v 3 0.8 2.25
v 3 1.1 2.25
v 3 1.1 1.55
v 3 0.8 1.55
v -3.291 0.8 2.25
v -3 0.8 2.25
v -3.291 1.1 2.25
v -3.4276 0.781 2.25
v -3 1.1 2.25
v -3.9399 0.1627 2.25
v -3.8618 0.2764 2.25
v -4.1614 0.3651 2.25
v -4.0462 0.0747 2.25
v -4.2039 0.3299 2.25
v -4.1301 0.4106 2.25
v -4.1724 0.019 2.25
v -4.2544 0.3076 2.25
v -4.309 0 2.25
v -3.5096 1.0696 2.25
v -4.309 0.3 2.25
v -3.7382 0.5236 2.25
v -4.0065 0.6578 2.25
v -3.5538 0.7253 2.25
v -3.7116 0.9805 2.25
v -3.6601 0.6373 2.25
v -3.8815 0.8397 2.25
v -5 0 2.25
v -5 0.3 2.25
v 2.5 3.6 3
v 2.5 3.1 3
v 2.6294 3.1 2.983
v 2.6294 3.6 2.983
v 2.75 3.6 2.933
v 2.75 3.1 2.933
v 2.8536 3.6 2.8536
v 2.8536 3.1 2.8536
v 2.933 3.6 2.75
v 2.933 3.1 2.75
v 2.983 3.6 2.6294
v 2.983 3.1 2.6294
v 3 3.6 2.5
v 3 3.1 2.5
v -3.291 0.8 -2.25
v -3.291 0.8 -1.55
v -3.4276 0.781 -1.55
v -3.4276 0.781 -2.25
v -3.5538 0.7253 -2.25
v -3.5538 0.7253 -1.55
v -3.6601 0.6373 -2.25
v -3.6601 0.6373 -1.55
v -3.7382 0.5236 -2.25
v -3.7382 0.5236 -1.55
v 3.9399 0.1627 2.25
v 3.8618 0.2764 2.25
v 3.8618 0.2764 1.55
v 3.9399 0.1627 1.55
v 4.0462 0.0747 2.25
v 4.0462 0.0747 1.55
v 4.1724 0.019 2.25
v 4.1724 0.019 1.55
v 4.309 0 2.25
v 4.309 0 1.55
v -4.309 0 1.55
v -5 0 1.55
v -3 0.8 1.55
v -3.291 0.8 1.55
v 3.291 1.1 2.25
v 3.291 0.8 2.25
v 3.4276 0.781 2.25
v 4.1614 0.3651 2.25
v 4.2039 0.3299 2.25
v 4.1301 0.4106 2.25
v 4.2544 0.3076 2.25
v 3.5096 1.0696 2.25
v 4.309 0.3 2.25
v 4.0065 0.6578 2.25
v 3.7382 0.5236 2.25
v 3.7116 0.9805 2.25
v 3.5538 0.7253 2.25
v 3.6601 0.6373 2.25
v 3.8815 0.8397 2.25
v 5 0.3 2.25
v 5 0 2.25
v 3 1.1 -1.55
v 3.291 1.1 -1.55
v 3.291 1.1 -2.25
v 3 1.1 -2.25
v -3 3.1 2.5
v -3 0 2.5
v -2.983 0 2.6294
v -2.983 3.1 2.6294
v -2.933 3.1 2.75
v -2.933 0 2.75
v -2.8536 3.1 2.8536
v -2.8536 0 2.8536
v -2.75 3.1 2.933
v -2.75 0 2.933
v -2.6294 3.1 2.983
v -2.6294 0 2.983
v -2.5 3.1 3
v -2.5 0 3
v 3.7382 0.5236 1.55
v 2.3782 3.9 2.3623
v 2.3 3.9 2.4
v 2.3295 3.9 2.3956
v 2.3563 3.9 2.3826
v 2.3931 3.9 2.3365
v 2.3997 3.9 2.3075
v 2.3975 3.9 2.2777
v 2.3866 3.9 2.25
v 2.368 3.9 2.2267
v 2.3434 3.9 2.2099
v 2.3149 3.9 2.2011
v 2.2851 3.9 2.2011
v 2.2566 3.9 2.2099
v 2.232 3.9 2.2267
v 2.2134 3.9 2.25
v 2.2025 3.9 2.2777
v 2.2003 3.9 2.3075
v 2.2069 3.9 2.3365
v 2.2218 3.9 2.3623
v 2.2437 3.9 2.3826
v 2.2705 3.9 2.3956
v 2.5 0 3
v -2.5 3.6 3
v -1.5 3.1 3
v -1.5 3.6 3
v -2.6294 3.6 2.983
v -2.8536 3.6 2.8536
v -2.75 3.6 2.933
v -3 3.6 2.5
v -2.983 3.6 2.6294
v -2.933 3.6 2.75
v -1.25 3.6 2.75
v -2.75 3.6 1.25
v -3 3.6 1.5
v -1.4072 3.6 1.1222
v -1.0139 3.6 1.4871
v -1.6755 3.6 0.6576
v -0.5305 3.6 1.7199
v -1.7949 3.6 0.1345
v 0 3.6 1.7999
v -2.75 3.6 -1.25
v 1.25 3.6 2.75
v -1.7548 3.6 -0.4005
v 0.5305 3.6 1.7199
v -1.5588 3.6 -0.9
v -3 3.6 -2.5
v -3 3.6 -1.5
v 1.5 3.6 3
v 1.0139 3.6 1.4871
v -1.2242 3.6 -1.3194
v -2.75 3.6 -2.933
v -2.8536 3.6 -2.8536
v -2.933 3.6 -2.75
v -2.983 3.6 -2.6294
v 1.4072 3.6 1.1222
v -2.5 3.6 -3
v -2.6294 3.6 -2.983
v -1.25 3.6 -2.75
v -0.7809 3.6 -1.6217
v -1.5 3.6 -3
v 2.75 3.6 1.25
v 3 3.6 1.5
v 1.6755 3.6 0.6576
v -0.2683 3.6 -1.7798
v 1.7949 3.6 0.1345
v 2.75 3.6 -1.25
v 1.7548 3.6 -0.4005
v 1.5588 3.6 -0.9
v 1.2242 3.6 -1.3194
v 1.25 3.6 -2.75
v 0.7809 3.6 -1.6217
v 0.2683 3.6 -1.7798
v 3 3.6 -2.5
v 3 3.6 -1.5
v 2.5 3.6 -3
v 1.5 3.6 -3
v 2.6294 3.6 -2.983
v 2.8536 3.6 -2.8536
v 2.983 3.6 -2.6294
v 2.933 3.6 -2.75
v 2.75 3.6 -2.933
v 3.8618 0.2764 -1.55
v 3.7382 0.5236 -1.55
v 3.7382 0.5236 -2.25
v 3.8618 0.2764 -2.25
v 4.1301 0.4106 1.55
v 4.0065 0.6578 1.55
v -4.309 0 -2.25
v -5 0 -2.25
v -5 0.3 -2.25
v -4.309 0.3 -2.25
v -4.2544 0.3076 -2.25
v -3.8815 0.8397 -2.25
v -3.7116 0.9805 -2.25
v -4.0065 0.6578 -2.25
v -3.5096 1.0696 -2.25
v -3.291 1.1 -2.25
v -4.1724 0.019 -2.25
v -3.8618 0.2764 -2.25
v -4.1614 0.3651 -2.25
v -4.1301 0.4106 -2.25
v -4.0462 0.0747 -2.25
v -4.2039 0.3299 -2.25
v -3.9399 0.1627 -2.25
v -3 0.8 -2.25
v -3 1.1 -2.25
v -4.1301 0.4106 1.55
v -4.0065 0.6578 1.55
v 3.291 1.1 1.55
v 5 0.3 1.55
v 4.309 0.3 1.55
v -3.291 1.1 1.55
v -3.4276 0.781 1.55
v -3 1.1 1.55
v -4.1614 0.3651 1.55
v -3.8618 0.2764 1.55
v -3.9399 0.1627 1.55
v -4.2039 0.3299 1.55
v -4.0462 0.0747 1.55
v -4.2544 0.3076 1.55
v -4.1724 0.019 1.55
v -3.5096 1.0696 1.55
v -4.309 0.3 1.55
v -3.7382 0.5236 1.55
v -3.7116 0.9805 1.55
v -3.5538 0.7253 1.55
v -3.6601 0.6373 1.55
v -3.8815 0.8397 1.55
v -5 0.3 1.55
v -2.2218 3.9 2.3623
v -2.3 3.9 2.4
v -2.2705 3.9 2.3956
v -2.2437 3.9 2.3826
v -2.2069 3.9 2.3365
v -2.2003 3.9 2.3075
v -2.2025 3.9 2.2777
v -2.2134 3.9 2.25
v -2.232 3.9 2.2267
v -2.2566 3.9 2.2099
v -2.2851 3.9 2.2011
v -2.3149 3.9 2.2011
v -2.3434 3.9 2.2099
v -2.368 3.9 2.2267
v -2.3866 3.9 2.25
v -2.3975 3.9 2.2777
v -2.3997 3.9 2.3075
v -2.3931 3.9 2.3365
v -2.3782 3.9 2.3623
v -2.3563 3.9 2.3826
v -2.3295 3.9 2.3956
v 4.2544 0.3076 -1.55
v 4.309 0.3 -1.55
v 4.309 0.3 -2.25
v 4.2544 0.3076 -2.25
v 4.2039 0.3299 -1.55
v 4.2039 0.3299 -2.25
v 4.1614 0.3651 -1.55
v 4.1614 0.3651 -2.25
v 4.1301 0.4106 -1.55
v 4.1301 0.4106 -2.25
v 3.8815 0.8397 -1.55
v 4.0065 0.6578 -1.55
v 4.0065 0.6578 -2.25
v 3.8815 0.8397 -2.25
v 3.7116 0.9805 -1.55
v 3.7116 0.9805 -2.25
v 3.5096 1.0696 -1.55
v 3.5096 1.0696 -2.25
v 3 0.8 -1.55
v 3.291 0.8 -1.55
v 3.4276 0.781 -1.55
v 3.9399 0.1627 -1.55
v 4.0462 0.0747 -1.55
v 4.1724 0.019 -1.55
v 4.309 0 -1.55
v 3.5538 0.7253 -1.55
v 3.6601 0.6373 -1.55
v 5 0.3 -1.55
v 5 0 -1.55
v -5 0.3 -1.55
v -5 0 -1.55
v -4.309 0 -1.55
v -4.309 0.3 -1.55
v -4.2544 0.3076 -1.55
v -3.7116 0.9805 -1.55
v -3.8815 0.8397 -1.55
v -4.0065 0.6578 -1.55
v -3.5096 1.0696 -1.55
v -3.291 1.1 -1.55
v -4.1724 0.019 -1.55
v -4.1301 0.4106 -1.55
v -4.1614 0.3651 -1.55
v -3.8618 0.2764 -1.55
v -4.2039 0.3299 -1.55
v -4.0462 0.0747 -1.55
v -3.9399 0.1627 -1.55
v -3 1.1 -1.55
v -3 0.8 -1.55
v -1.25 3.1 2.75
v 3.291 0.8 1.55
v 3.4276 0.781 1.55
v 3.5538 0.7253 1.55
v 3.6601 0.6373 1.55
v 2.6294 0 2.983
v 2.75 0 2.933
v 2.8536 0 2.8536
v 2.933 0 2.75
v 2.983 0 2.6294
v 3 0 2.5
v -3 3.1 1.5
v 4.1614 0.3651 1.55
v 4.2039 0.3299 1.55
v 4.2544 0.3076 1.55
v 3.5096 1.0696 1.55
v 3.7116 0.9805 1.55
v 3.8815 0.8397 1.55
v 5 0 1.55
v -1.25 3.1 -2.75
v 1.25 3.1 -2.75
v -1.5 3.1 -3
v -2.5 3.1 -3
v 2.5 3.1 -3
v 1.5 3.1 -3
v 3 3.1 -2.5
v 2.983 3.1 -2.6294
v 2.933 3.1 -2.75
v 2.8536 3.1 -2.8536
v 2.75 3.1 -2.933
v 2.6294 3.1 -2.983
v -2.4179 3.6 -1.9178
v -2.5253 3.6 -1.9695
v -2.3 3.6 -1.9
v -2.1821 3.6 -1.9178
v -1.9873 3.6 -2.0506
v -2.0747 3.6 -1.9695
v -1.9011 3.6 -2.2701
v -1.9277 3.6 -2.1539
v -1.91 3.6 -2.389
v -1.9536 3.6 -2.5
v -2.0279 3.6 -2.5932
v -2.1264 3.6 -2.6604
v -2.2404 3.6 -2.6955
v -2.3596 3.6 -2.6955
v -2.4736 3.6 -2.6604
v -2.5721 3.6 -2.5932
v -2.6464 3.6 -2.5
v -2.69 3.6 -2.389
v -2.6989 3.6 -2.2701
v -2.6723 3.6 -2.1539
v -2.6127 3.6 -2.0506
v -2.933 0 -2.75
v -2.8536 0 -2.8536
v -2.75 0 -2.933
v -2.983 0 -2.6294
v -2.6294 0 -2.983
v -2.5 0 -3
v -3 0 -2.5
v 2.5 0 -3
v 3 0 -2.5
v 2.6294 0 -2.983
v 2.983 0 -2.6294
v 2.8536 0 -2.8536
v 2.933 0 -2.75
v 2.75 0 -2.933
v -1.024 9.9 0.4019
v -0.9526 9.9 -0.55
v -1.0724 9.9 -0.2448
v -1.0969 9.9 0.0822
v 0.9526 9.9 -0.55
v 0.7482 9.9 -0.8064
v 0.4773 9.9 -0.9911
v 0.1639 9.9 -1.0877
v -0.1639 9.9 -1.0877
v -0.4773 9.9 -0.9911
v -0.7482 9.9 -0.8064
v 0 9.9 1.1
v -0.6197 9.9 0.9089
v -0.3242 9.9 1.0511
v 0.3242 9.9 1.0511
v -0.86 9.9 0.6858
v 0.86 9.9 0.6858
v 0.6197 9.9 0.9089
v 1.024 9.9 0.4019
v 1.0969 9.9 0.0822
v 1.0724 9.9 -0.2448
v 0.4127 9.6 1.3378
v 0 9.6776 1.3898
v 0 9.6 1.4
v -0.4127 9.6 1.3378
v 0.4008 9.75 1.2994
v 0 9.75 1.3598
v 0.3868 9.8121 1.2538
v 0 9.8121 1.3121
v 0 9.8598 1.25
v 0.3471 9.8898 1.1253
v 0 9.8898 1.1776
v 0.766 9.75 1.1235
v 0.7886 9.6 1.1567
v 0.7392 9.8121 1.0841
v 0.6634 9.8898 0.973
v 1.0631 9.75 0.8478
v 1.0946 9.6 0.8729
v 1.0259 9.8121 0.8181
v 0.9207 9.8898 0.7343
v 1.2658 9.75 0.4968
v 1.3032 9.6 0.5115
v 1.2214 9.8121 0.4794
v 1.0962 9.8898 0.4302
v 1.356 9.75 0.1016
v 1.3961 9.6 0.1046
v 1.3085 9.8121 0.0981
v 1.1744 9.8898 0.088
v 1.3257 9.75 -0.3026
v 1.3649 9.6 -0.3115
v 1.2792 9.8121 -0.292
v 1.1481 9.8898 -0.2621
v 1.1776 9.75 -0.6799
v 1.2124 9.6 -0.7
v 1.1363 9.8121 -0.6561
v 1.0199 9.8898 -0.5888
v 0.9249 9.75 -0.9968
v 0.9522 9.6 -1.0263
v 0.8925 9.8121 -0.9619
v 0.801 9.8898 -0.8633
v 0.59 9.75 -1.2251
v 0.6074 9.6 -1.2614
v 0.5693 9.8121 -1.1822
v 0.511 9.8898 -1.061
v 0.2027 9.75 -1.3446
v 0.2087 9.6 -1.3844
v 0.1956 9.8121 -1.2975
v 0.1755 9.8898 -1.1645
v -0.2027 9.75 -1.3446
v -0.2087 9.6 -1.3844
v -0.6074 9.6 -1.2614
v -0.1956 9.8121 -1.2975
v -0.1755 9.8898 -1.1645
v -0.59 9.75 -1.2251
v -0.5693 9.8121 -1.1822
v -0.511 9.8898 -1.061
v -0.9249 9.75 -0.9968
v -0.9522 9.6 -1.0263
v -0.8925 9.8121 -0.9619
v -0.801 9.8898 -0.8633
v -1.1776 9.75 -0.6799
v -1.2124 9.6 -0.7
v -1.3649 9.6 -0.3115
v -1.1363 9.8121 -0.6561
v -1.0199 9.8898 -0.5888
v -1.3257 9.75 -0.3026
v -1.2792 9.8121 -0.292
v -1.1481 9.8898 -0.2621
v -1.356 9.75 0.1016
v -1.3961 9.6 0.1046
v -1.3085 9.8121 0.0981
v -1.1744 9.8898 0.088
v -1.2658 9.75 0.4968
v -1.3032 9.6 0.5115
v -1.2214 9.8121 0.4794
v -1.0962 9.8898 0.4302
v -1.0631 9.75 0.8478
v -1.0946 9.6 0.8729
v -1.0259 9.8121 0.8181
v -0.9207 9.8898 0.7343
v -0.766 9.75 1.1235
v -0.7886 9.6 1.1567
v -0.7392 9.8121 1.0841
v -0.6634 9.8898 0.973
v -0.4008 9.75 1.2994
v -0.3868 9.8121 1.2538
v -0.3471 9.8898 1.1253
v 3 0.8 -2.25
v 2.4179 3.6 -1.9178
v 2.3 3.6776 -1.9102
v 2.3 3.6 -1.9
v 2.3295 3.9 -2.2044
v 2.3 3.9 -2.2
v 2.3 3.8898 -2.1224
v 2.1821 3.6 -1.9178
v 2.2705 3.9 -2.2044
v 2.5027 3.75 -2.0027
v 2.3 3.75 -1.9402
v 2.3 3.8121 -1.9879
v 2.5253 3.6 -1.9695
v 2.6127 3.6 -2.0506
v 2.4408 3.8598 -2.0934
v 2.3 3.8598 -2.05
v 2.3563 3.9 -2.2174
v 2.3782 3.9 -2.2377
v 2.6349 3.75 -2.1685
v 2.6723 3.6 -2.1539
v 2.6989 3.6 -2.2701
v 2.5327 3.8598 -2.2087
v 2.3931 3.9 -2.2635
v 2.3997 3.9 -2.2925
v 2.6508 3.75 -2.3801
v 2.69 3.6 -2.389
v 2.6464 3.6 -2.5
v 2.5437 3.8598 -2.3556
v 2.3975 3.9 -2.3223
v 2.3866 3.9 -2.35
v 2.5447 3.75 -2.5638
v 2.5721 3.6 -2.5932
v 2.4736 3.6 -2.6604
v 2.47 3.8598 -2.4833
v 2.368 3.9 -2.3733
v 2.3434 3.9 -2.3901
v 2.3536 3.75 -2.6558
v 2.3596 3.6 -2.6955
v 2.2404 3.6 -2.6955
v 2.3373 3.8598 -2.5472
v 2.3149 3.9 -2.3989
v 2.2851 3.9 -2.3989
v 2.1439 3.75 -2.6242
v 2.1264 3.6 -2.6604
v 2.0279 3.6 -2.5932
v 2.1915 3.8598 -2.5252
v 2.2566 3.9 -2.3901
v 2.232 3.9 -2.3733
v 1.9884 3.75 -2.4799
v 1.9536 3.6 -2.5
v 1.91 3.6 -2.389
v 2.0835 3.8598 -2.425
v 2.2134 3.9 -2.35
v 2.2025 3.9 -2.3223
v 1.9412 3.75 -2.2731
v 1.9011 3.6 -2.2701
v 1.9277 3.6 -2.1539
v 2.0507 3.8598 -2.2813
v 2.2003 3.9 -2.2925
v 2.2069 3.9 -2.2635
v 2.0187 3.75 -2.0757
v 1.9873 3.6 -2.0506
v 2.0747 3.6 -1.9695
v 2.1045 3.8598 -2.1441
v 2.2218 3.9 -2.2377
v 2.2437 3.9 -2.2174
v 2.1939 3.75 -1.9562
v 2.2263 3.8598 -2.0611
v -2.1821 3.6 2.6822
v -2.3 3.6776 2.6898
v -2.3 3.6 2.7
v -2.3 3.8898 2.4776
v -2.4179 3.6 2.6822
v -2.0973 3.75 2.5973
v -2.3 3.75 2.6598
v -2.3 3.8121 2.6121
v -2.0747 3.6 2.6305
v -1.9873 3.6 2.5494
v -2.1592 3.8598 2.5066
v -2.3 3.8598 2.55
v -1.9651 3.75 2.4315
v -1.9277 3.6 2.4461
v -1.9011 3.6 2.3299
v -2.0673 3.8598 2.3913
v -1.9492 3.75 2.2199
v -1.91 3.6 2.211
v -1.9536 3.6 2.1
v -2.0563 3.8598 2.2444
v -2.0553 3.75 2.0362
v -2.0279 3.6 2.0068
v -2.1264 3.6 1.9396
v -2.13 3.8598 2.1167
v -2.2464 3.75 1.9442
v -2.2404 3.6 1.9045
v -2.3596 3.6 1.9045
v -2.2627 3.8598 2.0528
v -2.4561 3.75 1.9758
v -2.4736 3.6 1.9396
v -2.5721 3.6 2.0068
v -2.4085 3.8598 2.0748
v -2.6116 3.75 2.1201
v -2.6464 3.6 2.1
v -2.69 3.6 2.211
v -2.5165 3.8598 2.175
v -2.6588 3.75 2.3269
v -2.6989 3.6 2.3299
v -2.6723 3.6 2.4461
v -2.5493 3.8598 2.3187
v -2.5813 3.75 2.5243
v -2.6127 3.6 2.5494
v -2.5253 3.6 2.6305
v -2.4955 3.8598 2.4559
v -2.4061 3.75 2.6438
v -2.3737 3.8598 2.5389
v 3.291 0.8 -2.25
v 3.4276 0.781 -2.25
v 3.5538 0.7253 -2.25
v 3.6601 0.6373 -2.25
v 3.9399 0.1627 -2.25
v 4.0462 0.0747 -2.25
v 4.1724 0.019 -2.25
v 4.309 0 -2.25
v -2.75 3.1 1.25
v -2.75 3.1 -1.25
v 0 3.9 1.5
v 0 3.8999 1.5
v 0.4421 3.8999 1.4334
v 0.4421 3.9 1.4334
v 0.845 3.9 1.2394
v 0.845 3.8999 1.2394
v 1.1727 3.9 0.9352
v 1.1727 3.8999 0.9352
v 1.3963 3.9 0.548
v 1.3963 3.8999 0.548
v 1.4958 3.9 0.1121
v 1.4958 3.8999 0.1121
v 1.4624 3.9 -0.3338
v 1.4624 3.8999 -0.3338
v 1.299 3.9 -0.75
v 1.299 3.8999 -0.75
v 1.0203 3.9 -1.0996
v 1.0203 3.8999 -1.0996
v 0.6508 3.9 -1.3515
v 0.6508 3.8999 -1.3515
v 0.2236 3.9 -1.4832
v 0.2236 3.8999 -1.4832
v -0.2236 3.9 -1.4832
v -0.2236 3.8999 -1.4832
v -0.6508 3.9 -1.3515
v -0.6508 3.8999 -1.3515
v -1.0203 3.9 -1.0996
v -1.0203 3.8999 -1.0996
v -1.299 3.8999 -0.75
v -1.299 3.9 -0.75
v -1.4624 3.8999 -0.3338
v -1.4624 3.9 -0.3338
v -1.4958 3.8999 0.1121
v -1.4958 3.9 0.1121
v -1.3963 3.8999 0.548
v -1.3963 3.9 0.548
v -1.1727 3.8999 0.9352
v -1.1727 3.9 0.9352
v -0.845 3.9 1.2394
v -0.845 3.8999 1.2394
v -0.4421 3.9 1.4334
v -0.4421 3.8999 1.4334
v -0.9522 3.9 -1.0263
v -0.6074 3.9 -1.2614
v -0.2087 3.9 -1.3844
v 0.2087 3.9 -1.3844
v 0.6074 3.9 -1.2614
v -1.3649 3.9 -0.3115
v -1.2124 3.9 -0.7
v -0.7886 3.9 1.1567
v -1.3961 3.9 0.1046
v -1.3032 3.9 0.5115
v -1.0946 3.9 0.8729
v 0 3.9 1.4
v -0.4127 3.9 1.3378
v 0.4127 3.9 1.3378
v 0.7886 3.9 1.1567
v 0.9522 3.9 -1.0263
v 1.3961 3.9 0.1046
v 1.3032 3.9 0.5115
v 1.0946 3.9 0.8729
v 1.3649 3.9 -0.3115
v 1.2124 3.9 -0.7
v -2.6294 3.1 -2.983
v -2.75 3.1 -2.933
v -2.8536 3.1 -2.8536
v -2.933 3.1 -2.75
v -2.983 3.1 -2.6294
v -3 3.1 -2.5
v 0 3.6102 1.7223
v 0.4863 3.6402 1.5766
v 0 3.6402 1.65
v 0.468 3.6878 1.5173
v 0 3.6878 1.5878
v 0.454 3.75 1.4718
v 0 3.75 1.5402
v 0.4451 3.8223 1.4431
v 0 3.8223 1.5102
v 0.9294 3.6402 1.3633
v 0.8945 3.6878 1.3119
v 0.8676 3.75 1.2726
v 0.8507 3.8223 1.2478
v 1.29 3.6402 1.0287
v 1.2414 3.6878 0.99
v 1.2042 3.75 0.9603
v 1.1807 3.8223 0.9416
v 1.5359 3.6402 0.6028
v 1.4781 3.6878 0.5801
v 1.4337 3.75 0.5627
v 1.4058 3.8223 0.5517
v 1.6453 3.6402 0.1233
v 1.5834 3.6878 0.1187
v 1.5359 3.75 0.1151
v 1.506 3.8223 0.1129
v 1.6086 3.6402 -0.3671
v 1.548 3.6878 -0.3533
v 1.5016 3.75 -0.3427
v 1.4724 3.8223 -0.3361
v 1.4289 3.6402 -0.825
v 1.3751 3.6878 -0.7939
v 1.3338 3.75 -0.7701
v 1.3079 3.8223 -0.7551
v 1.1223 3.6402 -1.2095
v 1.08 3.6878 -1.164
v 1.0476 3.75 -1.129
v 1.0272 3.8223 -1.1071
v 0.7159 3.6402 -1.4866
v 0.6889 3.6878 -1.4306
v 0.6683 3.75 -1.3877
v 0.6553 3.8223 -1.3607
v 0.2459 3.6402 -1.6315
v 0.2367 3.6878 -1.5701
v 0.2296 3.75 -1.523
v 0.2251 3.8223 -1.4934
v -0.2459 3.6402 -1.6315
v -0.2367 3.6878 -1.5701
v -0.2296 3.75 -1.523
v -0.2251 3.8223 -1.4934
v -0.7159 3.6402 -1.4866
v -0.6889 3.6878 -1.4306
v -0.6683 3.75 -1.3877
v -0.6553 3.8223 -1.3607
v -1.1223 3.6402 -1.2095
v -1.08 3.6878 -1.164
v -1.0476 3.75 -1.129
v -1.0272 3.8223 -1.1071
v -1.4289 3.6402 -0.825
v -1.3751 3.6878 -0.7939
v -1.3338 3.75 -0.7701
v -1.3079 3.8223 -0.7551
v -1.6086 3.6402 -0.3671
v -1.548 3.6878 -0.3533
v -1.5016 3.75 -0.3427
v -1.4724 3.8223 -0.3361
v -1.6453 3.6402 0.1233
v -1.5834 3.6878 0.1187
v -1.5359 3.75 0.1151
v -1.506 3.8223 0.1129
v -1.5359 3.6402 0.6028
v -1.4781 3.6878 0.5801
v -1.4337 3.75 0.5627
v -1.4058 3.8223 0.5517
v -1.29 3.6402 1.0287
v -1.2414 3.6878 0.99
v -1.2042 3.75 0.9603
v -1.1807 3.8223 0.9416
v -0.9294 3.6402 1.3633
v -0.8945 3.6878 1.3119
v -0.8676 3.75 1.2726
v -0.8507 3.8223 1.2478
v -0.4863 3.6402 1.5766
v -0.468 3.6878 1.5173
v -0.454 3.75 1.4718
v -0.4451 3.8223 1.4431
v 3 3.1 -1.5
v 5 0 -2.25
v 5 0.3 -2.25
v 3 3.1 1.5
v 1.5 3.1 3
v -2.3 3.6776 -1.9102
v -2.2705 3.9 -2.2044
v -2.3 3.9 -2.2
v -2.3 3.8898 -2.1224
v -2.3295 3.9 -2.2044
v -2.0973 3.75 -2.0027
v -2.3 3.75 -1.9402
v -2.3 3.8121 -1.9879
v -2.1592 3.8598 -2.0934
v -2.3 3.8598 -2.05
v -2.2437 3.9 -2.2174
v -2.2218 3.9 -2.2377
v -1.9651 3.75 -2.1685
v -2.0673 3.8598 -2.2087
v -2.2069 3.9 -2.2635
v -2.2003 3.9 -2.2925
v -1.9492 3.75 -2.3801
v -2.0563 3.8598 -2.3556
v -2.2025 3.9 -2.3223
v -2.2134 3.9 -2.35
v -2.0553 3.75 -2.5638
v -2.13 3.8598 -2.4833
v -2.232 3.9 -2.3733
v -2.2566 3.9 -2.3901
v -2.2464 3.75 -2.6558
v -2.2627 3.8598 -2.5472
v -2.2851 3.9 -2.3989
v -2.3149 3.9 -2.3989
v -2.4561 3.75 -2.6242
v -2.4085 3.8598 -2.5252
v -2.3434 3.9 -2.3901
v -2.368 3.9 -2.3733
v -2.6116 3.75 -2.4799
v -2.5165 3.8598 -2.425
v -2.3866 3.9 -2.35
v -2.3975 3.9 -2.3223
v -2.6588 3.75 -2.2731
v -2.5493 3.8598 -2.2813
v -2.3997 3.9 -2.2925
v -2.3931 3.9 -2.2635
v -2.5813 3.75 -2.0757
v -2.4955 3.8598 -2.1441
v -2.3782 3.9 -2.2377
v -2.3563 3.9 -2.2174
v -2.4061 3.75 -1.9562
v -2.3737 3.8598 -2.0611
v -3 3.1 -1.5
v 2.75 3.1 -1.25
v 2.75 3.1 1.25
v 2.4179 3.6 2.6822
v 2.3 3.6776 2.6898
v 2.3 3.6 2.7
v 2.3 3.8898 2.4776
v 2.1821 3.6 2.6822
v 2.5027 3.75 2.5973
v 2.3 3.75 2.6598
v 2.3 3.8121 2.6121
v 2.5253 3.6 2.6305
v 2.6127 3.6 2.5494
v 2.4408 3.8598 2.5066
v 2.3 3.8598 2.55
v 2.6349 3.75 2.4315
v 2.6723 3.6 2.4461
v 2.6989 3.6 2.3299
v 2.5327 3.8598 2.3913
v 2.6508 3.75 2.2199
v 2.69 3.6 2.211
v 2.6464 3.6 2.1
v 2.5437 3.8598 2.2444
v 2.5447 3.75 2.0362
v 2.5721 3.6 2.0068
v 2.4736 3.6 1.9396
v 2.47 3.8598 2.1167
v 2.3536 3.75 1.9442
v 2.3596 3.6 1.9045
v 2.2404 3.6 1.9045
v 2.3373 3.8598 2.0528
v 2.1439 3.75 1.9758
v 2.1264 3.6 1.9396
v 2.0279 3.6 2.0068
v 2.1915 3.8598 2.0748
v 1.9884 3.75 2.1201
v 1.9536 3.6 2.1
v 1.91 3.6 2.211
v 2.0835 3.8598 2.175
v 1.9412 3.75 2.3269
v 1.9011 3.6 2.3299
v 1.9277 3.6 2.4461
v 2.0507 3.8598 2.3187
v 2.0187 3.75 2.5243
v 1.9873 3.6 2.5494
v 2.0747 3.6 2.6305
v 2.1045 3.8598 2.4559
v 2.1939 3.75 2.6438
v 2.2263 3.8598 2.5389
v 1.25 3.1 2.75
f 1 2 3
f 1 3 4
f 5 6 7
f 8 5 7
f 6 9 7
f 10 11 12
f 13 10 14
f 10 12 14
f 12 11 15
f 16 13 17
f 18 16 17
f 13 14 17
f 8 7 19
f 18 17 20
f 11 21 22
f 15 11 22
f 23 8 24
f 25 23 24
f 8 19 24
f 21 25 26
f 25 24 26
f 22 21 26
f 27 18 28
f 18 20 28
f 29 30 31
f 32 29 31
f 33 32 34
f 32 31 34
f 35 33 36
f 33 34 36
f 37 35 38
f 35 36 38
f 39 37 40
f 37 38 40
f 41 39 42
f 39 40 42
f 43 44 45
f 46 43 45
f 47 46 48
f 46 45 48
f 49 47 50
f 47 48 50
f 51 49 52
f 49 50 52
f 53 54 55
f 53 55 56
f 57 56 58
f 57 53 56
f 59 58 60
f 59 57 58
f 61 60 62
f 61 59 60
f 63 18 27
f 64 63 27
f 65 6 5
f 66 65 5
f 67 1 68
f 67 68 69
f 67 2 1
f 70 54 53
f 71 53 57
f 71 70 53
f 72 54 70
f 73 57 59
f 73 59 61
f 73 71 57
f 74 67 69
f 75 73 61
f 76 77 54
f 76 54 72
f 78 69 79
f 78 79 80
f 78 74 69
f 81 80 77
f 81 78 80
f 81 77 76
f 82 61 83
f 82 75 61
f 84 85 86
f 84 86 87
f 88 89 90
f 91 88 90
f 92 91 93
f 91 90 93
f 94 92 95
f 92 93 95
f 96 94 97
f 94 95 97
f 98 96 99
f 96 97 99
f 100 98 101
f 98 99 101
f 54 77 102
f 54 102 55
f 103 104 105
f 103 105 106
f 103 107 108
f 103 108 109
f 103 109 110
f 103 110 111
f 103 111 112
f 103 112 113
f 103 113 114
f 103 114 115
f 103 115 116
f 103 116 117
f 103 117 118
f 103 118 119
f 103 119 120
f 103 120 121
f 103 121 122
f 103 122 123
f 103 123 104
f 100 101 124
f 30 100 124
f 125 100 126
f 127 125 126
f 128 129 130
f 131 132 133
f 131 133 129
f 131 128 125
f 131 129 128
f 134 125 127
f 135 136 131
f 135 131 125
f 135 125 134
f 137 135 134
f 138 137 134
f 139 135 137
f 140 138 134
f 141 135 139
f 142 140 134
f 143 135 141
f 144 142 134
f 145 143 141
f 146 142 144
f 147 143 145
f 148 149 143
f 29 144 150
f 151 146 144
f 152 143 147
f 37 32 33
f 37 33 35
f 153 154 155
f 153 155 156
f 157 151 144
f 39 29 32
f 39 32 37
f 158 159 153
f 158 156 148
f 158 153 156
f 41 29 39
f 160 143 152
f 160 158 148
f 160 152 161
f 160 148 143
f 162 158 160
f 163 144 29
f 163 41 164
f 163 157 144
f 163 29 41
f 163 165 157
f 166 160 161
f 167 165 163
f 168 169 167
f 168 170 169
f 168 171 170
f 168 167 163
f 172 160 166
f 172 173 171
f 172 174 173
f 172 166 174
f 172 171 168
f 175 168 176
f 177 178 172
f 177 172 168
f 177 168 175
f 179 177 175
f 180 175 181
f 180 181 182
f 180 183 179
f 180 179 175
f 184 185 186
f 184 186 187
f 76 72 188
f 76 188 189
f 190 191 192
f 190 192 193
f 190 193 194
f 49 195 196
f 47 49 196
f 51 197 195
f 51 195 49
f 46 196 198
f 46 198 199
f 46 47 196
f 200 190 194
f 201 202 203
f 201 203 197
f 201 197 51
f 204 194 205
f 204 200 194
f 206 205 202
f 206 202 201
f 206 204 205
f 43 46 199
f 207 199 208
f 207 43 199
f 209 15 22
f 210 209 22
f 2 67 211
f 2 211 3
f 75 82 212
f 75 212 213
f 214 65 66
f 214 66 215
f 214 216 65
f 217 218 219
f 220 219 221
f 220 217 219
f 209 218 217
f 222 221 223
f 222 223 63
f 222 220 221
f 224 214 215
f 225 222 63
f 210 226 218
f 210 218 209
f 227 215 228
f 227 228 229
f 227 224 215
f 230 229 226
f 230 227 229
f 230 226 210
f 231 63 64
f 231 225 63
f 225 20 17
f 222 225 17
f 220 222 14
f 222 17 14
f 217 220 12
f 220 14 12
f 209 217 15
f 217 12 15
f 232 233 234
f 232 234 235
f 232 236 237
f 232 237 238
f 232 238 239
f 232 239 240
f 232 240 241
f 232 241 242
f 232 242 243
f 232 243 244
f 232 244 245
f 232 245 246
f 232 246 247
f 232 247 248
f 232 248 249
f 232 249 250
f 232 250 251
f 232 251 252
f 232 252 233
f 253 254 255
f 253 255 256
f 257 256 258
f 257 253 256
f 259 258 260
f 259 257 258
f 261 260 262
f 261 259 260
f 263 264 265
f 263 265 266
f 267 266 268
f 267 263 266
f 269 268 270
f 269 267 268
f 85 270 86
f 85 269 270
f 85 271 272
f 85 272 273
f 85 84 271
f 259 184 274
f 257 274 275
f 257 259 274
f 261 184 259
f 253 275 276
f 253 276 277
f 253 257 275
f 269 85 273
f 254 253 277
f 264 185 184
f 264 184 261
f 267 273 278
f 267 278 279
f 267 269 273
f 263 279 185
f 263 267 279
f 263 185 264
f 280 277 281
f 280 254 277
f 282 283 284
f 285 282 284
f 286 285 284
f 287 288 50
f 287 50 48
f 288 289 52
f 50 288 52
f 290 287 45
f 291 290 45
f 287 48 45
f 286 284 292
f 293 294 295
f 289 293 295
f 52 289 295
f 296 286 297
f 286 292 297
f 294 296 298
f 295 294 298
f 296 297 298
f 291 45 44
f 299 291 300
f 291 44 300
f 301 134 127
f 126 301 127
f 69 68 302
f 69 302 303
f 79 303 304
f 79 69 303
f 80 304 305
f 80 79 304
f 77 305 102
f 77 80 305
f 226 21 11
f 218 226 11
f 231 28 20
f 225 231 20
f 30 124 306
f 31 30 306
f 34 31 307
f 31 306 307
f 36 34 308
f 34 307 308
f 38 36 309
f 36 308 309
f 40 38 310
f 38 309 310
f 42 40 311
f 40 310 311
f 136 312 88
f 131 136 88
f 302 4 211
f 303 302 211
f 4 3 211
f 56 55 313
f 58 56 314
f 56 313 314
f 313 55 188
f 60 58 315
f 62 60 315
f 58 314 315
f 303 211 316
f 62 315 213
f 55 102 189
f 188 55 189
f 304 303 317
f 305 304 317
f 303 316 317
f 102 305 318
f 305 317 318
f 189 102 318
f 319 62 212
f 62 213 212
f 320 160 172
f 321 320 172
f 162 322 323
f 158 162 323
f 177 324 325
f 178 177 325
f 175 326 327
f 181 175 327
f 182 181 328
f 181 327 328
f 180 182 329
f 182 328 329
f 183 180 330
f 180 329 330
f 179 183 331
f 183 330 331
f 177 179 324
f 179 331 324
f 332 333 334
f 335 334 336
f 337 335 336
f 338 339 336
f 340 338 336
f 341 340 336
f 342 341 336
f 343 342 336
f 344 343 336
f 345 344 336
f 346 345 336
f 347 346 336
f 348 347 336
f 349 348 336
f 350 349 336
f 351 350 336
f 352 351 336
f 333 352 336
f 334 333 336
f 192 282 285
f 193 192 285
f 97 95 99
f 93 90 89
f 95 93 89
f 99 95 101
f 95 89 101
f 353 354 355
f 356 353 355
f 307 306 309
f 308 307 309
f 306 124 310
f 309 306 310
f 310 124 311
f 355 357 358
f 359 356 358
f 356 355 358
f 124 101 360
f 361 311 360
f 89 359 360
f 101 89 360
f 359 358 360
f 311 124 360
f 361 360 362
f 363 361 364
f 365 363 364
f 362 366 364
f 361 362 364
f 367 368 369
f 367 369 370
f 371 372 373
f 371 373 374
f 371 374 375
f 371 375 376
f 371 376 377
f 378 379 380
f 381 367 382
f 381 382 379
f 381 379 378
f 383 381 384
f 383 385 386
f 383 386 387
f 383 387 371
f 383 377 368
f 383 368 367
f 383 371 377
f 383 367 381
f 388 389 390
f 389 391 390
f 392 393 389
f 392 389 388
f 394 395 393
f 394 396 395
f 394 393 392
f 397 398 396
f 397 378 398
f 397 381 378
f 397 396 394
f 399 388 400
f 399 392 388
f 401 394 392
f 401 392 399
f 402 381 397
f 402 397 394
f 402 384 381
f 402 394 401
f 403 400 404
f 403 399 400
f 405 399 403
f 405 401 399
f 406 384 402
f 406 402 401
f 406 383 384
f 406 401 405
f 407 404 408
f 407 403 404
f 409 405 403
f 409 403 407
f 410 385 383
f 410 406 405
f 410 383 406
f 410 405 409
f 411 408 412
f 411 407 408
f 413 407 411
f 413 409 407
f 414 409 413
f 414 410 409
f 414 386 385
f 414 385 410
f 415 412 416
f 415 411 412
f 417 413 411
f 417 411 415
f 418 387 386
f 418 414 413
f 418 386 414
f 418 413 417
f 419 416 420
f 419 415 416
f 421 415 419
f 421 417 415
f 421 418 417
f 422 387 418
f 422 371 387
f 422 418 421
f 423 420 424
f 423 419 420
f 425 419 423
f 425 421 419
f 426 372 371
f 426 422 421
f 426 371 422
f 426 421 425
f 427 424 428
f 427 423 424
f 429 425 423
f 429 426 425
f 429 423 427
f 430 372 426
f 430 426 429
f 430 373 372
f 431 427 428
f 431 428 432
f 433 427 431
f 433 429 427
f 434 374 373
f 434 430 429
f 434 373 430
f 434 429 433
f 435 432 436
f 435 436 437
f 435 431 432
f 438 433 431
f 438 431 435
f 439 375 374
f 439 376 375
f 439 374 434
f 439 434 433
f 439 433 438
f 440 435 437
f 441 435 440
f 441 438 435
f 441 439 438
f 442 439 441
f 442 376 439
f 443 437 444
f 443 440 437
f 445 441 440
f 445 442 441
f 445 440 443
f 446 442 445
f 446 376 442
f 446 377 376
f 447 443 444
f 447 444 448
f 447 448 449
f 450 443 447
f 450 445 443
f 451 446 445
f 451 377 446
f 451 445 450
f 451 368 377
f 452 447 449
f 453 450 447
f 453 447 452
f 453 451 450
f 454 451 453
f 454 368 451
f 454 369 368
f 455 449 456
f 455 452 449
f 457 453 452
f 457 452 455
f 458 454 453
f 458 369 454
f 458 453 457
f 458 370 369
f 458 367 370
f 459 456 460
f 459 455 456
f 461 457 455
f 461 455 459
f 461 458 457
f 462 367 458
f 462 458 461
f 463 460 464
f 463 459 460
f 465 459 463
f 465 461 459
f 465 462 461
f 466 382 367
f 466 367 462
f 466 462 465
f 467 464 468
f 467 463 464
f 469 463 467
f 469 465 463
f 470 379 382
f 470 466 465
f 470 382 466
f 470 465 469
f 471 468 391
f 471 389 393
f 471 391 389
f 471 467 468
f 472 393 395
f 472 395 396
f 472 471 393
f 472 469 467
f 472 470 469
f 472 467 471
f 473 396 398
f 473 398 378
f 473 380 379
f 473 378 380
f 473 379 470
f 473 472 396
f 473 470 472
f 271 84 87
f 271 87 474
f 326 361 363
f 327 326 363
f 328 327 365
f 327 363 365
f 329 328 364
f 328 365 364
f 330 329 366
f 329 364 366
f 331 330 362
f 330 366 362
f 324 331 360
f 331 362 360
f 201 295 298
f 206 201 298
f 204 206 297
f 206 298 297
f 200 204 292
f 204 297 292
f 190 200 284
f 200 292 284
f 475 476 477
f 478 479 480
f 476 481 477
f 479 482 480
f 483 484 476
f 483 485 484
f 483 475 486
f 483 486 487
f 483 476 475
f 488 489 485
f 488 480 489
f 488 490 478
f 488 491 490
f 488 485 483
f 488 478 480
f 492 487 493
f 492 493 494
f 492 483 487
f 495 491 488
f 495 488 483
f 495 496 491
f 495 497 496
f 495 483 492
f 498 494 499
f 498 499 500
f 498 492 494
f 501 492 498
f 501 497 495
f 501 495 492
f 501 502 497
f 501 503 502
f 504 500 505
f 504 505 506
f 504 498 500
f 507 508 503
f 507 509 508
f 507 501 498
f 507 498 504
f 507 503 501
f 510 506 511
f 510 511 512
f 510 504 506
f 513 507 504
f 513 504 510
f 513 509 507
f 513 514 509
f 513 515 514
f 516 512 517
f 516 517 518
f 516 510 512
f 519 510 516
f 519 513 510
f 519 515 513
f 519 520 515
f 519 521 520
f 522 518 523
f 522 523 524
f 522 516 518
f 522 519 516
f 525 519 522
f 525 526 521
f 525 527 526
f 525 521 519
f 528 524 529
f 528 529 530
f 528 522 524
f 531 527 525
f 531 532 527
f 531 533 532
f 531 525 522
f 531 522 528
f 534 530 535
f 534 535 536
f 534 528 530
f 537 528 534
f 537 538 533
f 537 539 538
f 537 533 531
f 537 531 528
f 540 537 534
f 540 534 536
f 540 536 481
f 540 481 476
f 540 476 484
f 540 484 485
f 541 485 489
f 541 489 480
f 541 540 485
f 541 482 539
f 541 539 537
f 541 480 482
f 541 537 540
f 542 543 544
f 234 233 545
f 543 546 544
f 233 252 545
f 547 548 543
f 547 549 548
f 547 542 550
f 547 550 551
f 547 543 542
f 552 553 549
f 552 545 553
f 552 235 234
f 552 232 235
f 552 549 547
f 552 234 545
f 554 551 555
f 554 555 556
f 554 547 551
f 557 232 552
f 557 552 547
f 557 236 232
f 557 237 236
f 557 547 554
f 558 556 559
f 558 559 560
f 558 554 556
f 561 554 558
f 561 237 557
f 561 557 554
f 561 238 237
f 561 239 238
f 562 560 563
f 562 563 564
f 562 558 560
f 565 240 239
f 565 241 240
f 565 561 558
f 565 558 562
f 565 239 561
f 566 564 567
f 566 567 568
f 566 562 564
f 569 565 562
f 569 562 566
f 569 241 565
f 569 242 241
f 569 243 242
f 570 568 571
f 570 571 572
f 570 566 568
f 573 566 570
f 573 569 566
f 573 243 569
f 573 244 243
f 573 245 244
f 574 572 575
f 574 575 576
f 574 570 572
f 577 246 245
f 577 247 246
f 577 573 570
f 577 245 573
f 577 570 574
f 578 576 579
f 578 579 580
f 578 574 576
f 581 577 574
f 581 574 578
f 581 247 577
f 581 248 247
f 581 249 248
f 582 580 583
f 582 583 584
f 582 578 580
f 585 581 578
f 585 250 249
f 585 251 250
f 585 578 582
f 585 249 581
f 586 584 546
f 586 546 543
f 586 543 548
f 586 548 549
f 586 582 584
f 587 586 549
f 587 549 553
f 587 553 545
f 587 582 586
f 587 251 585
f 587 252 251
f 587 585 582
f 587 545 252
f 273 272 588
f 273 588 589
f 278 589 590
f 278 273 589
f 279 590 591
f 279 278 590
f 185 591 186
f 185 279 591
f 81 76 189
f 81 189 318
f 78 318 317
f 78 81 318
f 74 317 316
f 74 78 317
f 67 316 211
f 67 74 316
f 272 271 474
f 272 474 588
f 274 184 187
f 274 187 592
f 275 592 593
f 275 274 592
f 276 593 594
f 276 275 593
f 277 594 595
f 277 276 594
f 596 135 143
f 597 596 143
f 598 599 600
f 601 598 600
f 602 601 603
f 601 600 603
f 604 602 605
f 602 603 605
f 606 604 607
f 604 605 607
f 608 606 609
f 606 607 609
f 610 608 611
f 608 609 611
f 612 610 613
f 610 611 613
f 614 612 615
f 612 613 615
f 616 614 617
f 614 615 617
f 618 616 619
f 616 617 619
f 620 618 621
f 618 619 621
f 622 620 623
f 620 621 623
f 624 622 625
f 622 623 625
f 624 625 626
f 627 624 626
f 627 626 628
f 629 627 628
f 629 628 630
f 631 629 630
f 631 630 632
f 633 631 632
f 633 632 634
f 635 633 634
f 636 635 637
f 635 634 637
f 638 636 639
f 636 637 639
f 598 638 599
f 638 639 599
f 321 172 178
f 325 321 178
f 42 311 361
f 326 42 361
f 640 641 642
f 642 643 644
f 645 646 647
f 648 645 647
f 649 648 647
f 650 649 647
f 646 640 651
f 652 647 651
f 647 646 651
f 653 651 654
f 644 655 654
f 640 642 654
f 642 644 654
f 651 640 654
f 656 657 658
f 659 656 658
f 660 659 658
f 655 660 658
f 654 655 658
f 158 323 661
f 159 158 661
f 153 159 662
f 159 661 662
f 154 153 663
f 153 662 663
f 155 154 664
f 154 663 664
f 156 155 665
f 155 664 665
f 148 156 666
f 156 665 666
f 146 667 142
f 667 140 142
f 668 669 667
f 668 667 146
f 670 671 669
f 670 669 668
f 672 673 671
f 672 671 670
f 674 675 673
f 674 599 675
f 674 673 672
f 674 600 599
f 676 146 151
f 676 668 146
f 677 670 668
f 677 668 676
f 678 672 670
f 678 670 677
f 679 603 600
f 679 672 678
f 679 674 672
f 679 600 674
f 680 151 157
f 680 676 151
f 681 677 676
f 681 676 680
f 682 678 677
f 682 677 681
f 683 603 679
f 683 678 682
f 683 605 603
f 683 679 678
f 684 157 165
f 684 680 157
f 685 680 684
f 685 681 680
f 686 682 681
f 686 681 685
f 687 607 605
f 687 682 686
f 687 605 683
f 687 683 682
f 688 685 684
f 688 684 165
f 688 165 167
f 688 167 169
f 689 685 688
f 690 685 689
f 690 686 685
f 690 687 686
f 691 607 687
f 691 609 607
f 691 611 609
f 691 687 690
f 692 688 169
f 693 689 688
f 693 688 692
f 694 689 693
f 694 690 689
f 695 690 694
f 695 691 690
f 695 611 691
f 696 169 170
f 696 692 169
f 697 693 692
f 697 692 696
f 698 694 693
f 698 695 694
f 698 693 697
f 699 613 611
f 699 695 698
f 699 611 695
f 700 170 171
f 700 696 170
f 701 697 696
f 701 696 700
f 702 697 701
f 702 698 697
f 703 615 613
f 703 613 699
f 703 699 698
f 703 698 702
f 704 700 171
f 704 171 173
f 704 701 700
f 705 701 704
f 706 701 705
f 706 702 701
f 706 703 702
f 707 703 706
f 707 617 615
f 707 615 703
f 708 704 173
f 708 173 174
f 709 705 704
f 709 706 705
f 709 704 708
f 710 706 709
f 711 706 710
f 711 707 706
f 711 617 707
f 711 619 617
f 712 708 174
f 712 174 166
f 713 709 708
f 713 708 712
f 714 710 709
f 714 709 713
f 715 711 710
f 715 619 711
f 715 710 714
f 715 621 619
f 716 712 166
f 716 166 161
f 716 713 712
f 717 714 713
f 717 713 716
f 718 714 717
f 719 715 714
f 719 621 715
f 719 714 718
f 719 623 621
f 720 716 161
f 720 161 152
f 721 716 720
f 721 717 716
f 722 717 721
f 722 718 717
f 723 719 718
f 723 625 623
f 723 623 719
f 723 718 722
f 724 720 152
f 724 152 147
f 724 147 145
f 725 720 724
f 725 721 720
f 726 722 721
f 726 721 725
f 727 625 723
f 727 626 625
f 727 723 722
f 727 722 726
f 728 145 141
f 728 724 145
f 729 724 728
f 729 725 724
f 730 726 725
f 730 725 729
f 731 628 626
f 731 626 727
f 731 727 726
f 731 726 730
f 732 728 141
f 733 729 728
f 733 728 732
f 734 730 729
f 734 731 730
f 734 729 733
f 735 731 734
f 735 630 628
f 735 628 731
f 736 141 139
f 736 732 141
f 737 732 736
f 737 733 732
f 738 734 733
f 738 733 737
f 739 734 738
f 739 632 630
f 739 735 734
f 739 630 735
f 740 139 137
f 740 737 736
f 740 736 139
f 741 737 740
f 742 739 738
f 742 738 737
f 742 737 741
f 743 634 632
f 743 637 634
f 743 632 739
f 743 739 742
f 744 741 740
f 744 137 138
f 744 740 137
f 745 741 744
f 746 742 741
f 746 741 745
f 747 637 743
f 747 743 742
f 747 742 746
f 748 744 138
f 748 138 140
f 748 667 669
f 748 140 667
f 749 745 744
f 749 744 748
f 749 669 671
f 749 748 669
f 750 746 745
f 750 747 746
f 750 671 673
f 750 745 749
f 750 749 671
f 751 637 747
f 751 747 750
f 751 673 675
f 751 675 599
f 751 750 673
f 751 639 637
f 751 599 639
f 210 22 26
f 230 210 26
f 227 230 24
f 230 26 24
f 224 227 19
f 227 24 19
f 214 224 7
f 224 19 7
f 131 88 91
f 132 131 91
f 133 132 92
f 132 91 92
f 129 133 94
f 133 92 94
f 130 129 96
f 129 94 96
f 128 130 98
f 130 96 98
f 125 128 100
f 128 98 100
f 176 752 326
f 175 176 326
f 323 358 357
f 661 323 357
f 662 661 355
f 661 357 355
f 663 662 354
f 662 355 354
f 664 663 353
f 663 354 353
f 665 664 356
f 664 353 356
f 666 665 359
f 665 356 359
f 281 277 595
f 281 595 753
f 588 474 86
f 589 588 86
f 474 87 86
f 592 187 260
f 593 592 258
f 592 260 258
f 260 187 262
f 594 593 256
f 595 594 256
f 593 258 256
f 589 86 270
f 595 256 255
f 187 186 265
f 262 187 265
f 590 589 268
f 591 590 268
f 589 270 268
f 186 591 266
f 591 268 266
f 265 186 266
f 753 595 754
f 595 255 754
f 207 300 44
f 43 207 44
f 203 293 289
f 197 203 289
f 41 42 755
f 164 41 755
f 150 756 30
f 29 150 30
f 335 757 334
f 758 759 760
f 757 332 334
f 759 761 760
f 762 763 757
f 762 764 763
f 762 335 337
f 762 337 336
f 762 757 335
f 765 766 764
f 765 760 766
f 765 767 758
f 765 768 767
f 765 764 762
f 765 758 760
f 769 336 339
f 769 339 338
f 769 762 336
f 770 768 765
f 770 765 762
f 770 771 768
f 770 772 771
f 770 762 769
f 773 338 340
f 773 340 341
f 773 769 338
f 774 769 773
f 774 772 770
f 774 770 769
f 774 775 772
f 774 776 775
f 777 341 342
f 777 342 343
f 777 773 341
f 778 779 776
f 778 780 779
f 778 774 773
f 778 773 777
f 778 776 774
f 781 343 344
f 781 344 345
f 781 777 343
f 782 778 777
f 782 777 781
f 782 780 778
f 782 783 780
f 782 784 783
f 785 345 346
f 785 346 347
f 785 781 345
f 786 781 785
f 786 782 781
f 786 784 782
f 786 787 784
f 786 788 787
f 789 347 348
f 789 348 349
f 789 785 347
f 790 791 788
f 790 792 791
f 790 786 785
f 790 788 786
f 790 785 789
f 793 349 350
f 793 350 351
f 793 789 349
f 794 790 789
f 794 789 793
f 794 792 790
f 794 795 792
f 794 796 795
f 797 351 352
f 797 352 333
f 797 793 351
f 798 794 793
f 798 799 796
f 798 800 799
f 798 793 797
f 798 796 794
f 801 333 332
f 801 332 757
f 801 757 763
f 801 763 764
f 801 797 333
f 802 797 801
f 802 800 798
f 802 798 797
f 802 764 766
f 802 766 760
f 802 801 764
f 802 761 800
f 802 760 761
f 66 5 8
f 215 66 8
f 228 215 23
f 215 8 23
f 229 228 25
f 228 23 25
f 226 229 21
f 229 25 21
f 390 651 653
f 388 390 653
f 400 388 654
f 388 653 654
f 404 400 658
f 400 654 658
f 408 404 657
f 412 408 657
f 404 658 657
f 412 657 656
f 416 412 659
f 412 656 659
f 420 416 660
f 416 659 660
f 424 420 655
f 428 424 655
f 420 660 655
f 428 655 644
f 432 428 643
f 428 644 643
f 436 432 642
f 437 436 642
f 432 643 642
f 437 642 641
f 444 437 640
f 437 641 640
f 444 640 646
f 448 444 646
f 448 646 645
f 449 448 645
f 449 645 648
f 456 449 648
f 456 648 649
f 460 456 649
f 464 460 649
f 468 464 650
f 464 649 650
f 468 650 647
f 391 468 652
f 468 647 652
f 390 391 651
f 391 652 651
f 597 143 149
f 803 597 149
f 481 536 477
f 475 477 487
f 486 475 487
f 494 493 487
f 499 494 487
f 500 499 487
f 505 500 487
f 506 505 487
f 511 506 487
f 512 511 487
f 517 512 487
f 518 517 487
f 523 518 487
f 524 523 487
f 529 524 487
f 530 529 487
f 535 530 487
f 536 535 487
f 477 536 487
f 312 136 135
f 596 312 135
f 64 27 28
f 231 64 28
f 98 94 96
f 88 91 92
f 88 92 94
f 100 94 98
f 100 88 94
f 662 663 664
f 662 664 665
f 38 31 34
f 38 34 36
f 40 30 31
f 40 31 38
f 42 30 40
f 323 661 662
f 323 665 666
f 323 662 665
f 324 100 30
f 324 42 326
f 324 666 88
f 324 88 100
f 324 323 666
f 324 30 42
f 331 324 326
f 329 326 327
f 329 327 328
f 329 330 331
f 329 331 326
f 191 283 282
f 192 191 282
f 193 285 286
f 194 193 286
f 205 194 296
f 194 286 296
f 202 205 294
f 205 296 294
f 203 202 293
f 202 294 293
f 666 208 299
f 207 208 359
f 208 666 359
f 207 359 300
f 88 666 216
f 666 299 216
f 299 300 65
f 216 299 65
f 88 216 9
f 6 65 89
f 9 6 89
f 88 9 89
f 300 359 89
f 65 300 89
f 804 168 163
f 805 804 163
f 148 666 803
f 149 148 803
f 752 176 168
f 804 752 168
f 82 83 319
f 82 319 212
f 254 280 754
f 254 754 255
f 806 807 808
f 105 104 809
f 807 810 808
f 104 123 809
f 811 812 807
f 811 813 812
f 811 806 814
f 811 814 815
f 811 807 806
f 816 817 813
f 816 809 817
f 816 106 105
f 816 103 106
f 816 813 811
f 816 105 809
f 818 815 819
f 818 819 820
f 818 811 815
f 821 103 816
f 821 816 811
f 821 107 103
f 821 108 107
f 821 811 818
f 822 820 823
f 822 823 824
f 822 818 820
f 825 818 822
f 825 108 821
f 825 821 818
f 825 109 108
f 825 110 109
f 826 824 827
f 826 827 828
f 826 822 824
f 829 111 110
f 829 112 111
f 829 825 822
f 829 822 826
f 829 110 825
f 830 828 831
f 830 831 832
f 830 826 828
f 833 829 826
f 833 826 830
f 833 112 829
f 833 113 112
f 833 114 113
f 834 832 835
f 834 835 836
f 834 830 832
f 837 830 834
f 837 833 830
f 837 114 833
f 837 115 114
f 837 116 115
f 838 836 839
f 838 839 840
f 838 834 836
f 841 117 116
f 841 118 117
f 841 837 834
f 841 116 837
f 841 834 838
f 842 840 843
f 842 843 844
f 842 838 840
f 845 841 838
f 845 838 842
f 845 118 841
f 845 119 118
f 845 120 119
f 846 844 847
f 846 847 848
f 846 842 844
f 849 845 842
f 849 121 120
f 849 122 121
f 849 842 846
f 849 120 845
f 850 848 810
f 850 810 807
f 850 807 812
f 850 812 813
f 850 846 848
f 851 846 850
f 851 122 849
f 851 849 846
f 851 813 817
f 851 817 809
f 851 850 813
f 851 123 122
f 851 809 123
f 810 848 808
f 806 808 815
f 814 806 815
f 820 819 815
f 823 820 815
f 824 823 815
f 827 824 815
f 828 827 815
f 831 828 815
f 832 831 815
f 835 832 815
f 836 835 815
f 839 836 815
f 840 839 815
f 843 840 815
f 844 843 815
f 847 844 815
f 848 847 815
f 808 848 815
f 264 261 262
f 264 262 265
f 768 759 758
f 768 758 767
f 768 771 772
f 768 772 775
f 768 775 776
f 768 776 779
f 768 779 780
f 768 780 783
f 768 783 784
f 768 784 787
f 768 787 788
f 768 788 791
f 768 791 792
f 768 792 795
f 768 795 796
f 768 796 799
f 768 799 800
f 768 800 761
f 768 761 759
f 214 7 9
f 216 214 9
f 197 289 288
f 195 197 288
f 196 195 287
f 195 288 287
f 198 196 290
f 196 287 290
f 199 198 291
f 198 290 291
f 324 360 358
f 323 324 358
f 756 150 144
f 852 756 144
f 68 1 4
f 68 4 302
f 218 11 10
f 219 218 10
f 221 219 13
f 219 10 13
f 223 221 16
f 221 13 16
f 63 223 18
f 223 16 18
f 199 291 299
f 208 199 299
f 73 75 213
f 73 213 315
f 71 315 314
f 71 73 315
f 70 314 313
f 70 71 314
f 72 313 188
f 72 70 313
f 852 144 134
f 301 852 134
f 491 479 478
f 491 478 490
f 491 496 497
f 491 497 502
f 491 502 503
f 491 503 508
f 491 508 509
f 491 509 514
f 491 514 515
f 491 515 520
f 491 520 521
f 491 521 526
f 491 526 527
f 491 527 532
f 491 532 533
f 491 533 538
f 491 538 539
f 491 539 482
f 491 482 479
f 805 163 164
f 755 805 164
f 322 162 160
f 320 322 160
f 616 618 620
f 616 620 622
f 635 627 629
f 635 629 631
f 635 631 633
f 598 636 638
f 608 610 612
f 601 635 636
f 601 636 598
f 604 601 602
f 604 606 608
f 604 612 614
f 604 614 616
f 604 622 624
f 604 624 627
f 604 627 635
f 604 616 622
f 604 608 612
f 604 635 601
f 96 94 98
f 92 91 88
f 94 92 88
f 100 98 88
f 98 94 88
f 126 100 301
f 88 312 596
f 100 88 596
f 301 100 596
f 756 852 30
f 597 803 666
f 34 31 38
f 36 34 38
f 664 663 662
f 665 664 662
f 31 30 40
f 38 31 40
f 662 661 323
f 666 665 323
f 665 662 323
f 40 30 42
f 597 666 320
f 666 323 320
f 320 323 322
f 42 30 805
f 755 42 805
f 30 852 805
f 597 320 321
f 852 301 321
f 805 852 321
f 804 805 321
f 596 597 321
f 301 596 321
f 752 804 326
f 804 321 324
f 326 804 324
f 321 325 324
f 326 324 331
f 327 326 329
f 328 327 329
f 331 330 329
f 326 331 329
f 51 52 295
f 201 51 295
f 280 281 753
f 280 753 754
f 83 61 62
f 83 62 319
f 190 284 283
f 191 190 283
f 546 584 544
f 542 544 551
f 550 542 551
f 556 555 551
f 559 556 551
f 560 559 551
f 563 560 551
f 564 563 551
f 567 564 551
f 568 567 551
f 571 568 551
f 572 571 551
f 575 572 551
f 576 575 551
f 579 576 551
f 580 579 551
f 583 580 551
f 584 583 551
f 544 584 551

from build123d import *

# Parameters (mm, degrees)
BOSS_EXTRUDE1_DEPTH   = 3.1
BOSS_EXTRUDE2_DEPTH   = 0.5
SKETCH3_R             = 0.4
BOSS_EXTRUDE3_DEPTH   = 0.3
BOSS_EXTRUDE3_2_DEPTH = 0.3
BOSS_EXTRUDE3_3_DEPTH = 0.3
BOSS_EXTRUDE3_4_DEPTH = 0.3
FILLET1_R             = 0.3
FILLET2_R             = 0.3
FILLET3_R             = 0.3
FILLET4_R             = 0.3
SKETCH4_R             = 1.5
BOSS_EXTRUDE4_DEPTH   = 0.3
BOSS_EXTRUDE6_START   = 2.25
BOSS_EXTRUDE6_DEPTH   = 0.7
LPATTERN1_COUNT       = 2
LPATTERN1_PITCH       = 3.8
MIRROR5_START         = 2.25
MIRROR5_COPY_1_DEPTH  = 0.7
CUT_EXTRUDE1_DEPTH    = 0.5
FILLET8_R             = 0.3
SKETCH10_R            = 1.4
BOSS_EXTRUDE10_DEPTH  = 6
FILLET9_R             = 0.3


# Some blends are built 0.0001 mm under size
with BuildPart() as part:
    # Sketch1 → Boss-Extrude1 (new body)
    with BuildSketch(Plane(origin=(0, 0, 0), x_dir=(1, 0, 0), z_dir=(0, 1, 0))):
        with BuildLine():
            Line((-2.5, -3), (2.5, -3))
            ThreePointArc((2.5, -3), (2.853553391, -2.853553391), (3, -2.5))
            Line((3, -2.5), (3, 2.5))
            ThreePointArc((3, 2.5), (2.853553391, 2.853553391), (2.5, 3))
            Line((2.5, 3), (-2.5, 3))
            ThreePointArc((-2.5, 3), (-2.853553391, 2.853553391), (-3, 2.5))
            Line((-3, 2.5), (-3, -2.5))
            ThreePointArc((-3, -2.5), (-2.853553391, -2.853553391), (-2.5, -3))
        make_face()
    extrude(amount=BOSS_EXTRUDE1_DEPTH)


with BuildPart() as body_2:
    # Sketch2 → Boss-Extrude2 (new body)
    with BuildSketch(Plane(origin=(0, 3.1, 0), x_dir=(1, 0, 0), z_dir=(0, 1, 0))):
        with BuildLine():
            Line((-2.5, -3), (2.5, -3))
            ThreePointArc((2.5, -3), (2.853553391, -2.853553391), (3, -2.5))
            Line((3, -2.5), (3, 2.5))
            ThreePointArc((3, 2.5), (2.853553391, 2.853553391), (2.5, 3))
            Line((2.5, 3), (-2.5, 3))
            ThreePointArc((-2.5, 3), (-2.853553391, 2.853553391), (-3, 2.5))
            Line((-3, 2.5), (-3, -2.5))
            ThreePointArc((-3, -2.5), (-2.853553391, -2.853553391), (-2.5, -3))
        make_face()
    extrude(amount=BOSS_EXTRUDE2_DEPTH)

    # Sketch4 → Boss-Extrude4 (add)
    with BuildSketch(Plane(origin=(0, 3.6, 0), x_dir=(1, 0, 0), z_dir=(0, 1, 0))):
        with Locations(Location((0, 0, 0), (0, 0, 270))):
            Circle(SKETCH4_R)
    extrude(amount=BOSS_EXTRUDE4_DEPTH)

    # Sketch7 → Cut-Extrude1 (cut)
    with BuildSketch(Plane(origin=(0, 3.6, 0), x_dir=(1, 0, 0), z_dir=(0, 1, 0))):
        Polygon((-1.5, 3), (-1.25, 2.75), (1.25, 2.75), (1.5, 3), align=None)
        Polygon((3, -1.5), (3, 1.5), (2.75, 1.25), (2.75, -1.25), align=None)
        Polygon((-1.5, -3), (1.5, -3), (1.25, -2.75), (-1.25, -2.75), align=None)
        Polygon((-3, 1.5), (-3, -1.5), (-2.75, -1.25), (-2.75, 1.25), align=None)
    extrude(amount=-CUT_EXTRUDE1_DEPTH, mode=Mode.SUBTRACT)

    # Fillet8
    fillet8_edges = [body_2.edges().sort_by_distance(p)[0] for p in [
        (0, 3.6, -1.5),
    ]]
    fillet(fillet8_edges, radius=FILLET8_R - 0.0001)  # a hair under: the kernel refuses the full size


with BuildPart() as body_3:
    # Sketch3 → Boss-Extrude3 (new body)
    with BuildSketch(Plane(origin=(0, 3.6, 0), x_dir=(1, 0, 0), z_dir=(0, 1, 0))):
        with Locations(Location((-2.3, 2.3, 0), (0, 0, 270))):
            Circle(SKETCH3_R)
    extrude(amount=BOSS_EXTRUDE3_DEPTH)

    # Fillet2
    # the kernel refuses this fillet: 0.3 mm, written as the material it takes off along each edge
    with BuildSketch(Plane(origin=(-2.3, 3.9, -2.3), x_dir=(0, 0, 1), z_dir=(-1, 0, 0))) as fillet2_piece_1:
        with BuildLine():
            CenterArc((0.4 - FILLET2_R, -FILLET2_R), FILLET2_R, 0, 90)
            Line((0.4 - FILLET2_R, 0), (0.4, 0))
            Line((0.4, 0), (0.4, -FILLET2_R))
        make_face()
    revolve(axis=Axis((-2.3, 3.9, -2.3), (0, 1, 0)), mode=Mode.SUBTRACT)


with BuildPart() as body_4:
    # Sketch3 → Boss-Extrude3 2 (new body)
    with BuildSketch(Plane(origin=(0, 3.6, 0), x_dir=(1, 0, 0), z_dir=(0, 1, 0))):
        with Locations(Location((2.3, 2.3, 0), (0, 0, 270))):
            Circle(SKETCH3_R)
    extrude(amount=BOSS_EXTRUDE3_2_DEPTH)

    # Fillet3
    # the kernel refuses this fillet: 0.3 mm, written as the material it takes off along each edge
    with BuildSketch(Plane(origin=(2.3, 3.9, -2.3), x_dir=(0, 0, 1), z_dir=(-1, 0, 0))) as fillet3_piece_1:
        with BuildLine():
            CenterArc((0.4 - FILLET3_R, -FILLET3_R), FILLET3_R, 0, 90)
            Line((0.4 - FILLET3_R, 0), (0.4, 0))
            Line((0.4, 0), (0.4, -FILLET3_R))
        make_face()
    revolve(axis=Axis((2.3, 3.9, -2.3), (0, 1, 0)), mode=Mode.SUBTRACT)


with BuildPart() as body_5:
    # Sketch3 → Boss-Extrude3 3 (new body)
    with BuildSketch(Plane(origin=(0, 3.6, 0), x_dir=(1, 0, 0), z_dir=(0, 1, 0))):
        with Locations(Location((2.3, -2.3, 0), (0, 0, 270))):
            Circle(SKETCH3_R)
    extrude(amount=BOSS_EXTRUDE3_3_DEPTH)

    # Fillet4
    # the kernel refuses this fillet: 0.3 mm, written as the material it takes off along each edge
    with BuildSketch(Plane(origin=(2.3, 3.9, 2.3), x_dir=(0, 0, 1), z_dir=(-1, 0, 0))) as fillet4_piece_1:
        with BuildLine():
            CenterArc((0.4 - FILLET4_R, -FILLET4_R), FILLET4_R, 0, 90)
            Line((0.4 - FILLET4_R, 0), (0.4, 0))
            Line((0.4, 0), (0.4, -FILLET4_R))
        make_face()
    revolve(axis=Axis((2.3, 3.9, 2.3), (0, 1, 0)), mode=Mode.SUBTRACT)


with BuildPart() as body_6:
    # Sketch3 → Boss-Extrude3 4 (new body)
    with BuildSketch(Plane(origin=(0, 3.6, 0), x_dir=(1, 0, 0), z_dir=(0, 1, 0))):
        with Locations(Location((-2.3, -2.3, 0), (0, 0, 270))):
            Circle(SKETCH3_R)
    extrude(amount=BOSS_EXTRUDE3_4_DEPTH)

    # Fillet1
    # the kernel refuses this fillet: 0.3 mm, written as the material it takes off along each edge
    with BuildSketch(Plane(origin=(-2.3, 3.9, 2.3), x_dir=(0, 0, 1), z_dir=(-1, 0, 0))) as fillet1_piece_1:
        with BuildLine():
            CenterArc((0.4 - FILLET1_R, -FILLET1_R), FILLET1_R, 0, 90)
            Line((0.4 - FILLET1_R, 0), (0.4, 0))
            Line((0.4, 0), (0.4, -FILLET1_R))
        make_face()
    revolve(axis=Axis((-2.3, 3.9, 2.3), (0, 1, 0)), mode=Mode.SUBTRACT)


with BuildPart() as body_7:
    # Sketch6 → Boss-Extrude6 (new body)
    with BuildSketch(Plane.XY.offset(BOSS_EXTRUDE6_START)):
        with BuildLine():
            Line((3, 0.8), (3.290983006, 0.8))
            ThreePointArc((3.290983006, 0.8), (3.553848562, 0.725325404), (3.738196601, 0.523606798))
            Line((3.738196601, 0.523606798), (3.861803399, 0.276393202))
            ThreePointArc((3.861803399, 0.276393202), (4.046151438, 0.074674596), (4.309016994, 0))
            Line((4.309016994, 0), (5, 0))
            Line((5, 0), (5, 0.3))
            Line((5, 0.3), (4.309016994, 0.3))
            ThreePointArc((4.309016994, 0.3), (4.203870772, 0.329869838), (4.130131556, 0.410557281))
            Line((4.130131556, 0.410557281), (4.006524758, 0.657770876))
            ThreePointArc((4.006524758, 0.657770876), (3.711567895, 0.980520647), (3.290983006, 1.1))
            Line((3.290983006, 1.1), (3, 1.1))
            Line((3, 1.1), (3, 0.8))
        make_face()
    boss_extrude6 = extrude(amount=-BOSS_EXTRUDE6_DEPTH)


with BuildPart() as lpattern1_1:
    # LPattern1: Boss-Extrude6 ×2
    with Locations(*[(0, 0, -i * LPATTERN1_PITCH) for i in range(1, LPATTERN1_COUNT)]):
        add(boss_extrude6)


with BuildPart() as part_1:
    add(part.part)

    # Mirror5: Boss-Extrude6 across plane
    add(boss_extrude6.mirror(Plane(origin=(0, 0, 0), x_dir=(0, 0, 1), z_dir=(1, 0, 0))))

    # Mirror5 copy 1 sketch → Mirror5 copy 1 (add)
    with BuildSketch(Plane(origin=(0, 0, -3.8), x_dir=(-1, 0, 0), z_dir=(0, 0, 1)).offset(MIRROR5_START)):
        with BuildLine():
            Line((3, -0.8), (3.290983006, -0.8))
            ThreePointArc((3.290983006, -0.8), (3.553848562, -0.725325404), (3.738196601, -0.523606798))
            Line((3.738196601, -0.523606798), (3.861803399, -0.276393202))
            ThreePointArc((3.861803399, -0.276393202), (4.046151438, -0.074674596), (4.309016994, 0))
            Line((4.309016994, 0), (5, 0))
            Line((5, 0), (5, -0.3))
            Line((5, -0.3), (4.309016994, -0.3))
            ThreePointArc((4.309016994, -0.3), (4.203870772, -0.329869838), (4.130131556, -0.410557281))
            Line((4.130131556, -0.410557281), (4.006524758, -0.657770876))
            ThreePointArc((4.006524758, -0.657770876), (3.711567895, -0.980520647), (3.290983006, -1.1))
            Line((3.290983006, -1.1), (3, -1.1))
            Line((3, -1.1), (3, -0.8))
        make_face()
    extrude(amount=-MIRROR5_COPY_1_DEPTH)


with BuildPart() as body_9:
    # Sketch10 → Boss-Extrude10 (new body)
    with BuildSketch(Plane(origin=(0, 3.9, 0), x_dir=(1, 0, 0), z_dir=(0, 1, 0))):
        with Locations(Location((0, 0, 0), (0, 0, 270))):
            Circle(SKETCH10_R)
    extrude(amount=BOSS_EXTRUDE10_DEPTH)

    # Fillet9
    fillet9_edges = [body_9.edges().sort_by_distance(p)[0] for p in [
        (0, 9.9, -1.4),
    ]]
    fillet(fillet9_edges, radius=FILLET9_R)


solid = Compound([body_2.part, body_3.part, body_4.part, body_5.part, body_6.part, body_7.part, lpattern1_1.part, part_1.part, body_9.part])
